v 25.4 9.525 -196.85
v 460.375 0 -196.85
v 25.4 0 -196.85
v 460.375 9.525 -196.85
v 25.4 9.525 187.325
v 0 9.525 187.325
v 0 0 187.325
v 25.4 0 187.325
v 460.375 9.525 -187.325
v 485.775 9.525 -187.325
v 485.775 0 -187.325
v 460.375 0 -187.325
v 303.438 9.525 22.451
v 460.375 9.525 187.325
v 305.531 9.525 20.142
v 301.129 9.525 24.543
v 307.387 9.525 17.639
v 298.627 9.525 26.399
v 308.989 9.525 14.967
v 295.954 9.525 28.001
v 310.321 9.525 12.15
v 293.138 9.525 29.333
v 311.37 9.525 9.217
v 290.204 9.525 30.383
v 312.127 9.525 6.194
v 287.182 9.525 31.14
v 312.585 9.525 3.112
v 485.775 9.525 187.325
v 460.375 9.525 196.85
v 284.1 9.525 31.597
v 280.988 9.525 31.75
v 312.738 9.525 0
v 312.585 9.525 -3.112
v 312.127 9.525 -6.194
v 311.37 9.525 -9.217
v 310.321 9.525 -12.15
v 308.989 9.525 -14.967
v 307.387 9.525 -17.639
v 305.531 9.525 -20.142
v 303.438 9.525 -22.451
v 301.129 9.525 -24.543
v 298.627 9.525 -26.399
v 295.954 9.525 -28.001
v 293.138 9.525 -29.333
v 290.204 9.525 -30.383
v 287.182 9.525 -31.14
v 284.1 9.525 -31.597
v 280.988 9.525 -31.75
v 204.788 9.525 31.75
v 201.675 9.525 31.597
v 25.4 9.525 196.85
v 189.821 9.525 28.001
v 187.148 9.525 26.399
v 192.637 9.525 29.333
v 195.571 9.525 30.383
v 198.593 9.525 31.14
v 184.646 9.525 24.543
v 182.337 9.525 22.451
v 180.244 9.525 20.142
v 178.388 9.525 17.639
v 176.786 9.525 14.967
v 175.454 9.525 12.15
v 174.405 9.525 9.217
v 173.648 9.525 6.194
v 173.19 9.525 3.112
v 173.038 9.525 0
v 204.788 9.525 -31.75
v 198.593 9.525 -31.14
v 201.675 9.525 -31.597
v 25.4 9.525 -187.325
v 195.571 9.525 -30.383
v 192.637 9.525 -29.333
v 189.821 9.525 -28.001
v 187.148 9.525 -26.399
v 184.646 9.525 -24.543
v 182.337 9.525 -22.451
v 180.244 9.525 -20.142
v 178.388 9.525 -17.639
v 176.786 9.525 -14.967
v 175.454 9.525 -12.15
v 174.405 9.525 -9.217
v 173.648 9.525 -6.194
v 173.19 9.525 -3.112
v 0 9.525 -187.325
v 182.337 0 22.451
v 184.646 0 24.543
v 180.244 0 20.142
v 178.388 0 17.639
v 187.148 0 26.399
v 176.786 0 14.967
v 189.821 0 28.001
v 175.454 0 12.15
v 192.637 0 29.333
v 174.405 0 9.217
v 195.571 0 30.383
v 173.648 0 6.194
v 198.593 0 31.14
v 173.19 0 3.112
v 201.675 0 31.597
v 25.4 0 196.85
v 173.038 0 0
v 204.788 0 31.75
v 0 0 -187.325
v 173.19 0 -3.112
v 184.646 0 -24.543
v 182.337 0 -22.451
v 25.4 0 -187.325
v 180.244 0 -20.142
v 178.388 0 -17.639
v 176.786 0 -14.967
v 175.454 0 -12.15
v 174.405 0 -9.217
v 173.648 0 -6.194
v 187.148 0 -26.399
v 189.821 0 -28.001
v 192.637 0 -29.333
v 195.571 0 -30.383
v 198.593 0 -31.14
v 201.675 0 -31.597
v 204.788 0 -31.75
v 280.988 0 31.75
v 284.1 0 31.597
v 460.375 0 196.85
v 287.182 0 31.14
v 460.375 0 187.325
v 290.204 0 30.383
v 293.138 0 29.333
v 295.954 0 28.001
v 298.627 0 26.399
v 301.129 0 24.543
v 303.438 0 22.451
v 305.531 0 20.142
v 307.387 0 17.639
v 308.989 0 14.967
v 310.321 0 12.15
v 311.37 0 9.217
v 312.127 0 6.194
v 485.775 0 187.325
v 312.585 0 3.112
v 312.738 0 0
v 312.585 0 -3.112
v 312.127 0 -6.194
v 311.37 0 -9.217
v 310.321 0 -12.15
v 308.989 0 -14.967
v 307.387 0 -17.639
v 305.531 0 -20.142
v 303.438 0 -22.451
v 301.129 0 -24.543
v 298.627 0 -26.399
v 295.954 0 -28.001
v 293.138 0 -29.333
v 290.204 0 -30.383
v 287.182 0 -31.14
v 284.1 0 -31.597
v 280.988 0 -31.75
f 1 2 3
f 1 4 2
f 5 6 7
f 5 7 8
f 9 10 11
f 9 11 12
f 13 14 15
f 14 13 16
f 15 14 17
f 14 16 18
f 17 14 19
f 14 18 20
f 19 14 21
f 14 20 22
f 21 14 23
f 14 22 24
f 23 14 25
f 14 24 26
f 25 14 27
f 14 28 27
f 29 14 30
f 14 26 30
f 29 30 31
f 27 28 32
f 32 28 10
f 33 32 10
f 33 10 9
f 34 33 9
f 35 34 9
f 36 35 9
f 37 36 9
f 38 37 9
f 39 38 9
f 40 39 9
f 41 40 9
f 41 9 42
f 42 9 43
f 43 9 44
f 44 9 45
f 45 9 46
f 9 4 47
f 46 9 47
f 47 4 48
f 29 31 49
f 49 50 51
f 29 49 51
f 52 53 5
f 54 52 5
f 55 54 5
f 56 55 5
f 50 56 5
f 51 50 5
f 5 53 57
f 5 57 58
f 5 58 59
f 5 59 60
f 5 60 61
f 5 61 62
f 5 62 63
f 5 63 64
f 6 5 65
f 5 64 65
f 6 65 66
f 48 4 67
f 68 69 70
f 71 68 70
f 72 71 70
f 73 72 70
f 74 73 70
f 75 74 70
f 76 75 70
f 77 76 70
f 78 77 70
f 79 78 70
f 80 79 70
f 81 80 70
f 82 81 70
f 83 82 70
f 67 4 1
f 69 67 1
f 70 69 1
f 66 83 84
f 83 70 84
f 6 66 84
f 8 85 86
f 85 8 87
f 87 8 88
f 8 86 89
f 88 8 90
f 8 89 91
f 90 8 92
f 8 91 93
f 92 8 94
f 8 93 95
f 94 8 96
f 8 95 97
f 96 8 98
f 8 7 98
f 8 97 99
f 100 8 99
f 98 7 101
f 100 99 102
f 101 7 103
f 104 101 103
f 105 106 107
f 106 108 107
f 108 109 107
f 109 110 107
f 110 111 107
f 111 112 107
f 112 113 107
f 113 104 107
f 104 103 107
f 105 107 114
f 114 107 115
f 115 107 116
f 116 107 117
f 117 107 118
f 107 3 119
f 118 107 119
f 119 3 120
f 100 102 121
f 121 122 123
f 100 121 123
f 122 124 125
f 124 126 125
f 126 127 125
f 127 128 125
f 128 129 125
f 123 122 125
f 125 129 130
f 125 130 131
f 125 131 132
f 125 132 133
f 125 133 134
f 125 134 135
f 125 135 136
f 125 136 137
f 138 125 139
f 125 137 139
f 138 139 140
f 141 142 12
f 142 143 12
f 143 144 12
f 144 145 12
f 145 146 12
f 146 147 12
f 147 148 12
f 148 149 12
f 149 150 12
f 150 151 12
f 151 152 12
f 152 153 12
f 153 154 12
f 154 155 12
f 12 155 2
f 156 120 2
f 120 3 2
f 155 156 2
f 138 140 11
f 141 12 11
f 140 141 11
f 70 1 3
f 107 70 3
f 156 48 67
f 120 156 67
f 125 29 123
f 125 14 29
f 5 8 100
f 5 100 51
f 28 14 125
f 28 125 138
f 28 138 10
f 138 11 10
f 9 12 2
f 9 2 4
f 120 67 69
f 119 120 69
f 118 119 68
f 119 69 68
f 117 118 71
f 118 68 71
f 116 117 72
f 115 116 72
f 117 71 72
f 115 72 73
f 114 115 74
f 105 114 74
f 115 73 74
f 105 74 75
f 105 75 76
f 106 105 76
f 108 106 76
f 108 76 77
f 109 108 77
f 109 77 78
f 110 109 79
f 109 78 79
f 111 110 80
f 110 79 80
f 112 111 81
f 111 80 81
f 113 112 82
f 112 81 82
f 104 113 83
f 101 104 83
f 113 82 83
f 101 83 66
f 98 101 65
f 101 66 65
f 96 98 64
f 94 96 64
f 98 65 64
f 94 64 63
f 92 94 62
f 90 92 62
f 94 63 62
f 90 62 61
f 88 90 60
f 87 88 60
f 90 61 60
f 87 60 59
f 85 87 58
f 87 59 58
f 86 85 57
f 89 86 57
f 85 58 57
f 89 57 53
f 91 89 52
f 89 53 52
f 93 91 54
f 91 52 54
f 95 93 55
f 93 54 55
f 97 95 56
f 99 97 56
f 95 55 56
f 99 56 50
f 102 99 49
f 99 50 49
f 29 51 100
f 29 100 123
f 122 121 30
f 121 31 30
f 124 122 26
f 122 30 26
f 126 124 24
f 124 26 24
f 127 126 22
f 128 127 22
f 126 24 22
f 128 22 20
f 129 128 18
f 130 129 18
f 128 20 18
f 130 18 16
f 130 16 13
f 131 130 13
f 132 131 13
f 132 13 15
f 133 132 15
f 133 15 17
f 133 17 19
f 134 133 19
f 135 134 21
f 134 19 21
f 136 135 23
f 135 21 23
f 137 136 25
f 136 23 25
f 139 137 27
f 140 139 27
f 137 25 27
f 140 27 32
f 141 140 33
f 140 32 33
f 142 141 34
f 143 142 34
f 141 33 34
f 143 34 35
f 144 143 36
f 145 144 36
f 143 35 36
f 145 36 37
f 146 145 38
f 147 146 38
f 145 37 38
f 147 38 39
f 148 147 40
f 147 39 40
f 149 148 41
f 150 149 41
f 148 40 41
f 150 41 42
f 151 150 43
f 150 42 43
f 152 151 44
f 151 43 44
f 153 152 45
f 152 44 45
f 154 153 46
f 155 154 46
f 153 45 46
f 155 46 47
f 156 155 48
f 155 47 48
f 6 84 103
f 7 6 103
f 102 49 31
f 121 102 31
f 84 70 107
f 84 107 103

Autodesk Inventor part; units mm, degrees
ref_plane "YZ Plane" through (0, 0, 0) normal (1, 0, 0) x (0, 1, 0)
ref_plane "XZ Plane" through (0, 0, 0) normal (0, 1, 0) x (-1, 0, 0)
ref_plane "XY Plane" through (0, 0, 0) normal (0, 0, 1) x (1, 0, 0)
sketch "Sketch1" plane through (0, 0, 0) normal (0, 0, 1) x (1, 0, 0)
  line L0 (0, 0) -> (485.775, 0)
  line L1 (485.775, 0) -> (485.775, 9.525)
  line L2 (485.775, 9.525) -> (0, 9.525)
  line L3 (0, 9.525) -> (0, 0)
  dimension "d0" = 485.775
  dimension "d1" = 9.525
extrude "Extrusion1" add sketch "Sketch1" along normal blind 187.325
sketch "Sketch2" plane through (0, 0, 187.325) normal (0, 0, 1) x (1, 0, 0)
  line L0 (0, 0) -> (485.775, 0) projected
  line L1 (485.775, 0) -> (485.775, 9.525) projected
  line L2 (485.775, 9.525) -> (0, 9.525) projected
  line L3 (0, 9.525) -> (0, 0) projected
  line L4 (25.4, 9.525) -> (460.375, 9.525)
  line L5 (460.375, 9.525) -> (460.375, 0)
  line L6 (460.375, 0) -> (25.4, 0)
  line L7 (25.4, 0) -> (25.4, 9.525)
  dimension "d4" = 25.4
  dimension "d5" = 25.4
extrude "Extrusion2" add sketch "Sketch2" along normal blind 9.525 contours L7 L2 L5 L0
mirror "Mirror1" about plane through (242.8875, 4.7625, 0) normal (0, 0, -1)
sketch "Sketch3" plane through (25.4, 9.525, 196.85) normal (0, 1, 0) x (1, 0, 0)
  line L0 (-25.4, 384.175) -> (-25.4, 9.525) projected
  line L1 (0, 9.525) -> (-25.4, 9.525) projected
  line L2 (460.375, 384.175) -> (460.375, 9.525) projected
  line L3 (434.975, 393.7) -> (0, 393.7) projected
  line L4 (179.3875, 196.85) -> (255.5875, 196.85) construction
  line L5 (179.3875, 165.1) -> (255.5875, 165.1)
  line L6 (255.5875, 228.6) -> (179.3875, 228.6)
  arc A0 (179.3875, 228.6) -> (179.3875, 165.1) centre (179.3875, 196.85) ccw
  arc A1 (255.5875, 165.1) -> (255.5875, 228.6) centre (255.5875, 196.85) ccw
  point P0 (-25.4, 196.85)
  point P1 (217.4875, 196.85)
  dimension "d8" = 76.2
  dimension "d9" = 31.75
  dimension "d10" = 196.85
  dimension "d11" = 242.8875
  dimension "d12" = 242.8875
extrude "Extrusion3" cut sketch "Sketch3" against normal through all
equation "\"d11\" = d12"
properties part number "top_cover_sheet" material "Wood (Birch)"
